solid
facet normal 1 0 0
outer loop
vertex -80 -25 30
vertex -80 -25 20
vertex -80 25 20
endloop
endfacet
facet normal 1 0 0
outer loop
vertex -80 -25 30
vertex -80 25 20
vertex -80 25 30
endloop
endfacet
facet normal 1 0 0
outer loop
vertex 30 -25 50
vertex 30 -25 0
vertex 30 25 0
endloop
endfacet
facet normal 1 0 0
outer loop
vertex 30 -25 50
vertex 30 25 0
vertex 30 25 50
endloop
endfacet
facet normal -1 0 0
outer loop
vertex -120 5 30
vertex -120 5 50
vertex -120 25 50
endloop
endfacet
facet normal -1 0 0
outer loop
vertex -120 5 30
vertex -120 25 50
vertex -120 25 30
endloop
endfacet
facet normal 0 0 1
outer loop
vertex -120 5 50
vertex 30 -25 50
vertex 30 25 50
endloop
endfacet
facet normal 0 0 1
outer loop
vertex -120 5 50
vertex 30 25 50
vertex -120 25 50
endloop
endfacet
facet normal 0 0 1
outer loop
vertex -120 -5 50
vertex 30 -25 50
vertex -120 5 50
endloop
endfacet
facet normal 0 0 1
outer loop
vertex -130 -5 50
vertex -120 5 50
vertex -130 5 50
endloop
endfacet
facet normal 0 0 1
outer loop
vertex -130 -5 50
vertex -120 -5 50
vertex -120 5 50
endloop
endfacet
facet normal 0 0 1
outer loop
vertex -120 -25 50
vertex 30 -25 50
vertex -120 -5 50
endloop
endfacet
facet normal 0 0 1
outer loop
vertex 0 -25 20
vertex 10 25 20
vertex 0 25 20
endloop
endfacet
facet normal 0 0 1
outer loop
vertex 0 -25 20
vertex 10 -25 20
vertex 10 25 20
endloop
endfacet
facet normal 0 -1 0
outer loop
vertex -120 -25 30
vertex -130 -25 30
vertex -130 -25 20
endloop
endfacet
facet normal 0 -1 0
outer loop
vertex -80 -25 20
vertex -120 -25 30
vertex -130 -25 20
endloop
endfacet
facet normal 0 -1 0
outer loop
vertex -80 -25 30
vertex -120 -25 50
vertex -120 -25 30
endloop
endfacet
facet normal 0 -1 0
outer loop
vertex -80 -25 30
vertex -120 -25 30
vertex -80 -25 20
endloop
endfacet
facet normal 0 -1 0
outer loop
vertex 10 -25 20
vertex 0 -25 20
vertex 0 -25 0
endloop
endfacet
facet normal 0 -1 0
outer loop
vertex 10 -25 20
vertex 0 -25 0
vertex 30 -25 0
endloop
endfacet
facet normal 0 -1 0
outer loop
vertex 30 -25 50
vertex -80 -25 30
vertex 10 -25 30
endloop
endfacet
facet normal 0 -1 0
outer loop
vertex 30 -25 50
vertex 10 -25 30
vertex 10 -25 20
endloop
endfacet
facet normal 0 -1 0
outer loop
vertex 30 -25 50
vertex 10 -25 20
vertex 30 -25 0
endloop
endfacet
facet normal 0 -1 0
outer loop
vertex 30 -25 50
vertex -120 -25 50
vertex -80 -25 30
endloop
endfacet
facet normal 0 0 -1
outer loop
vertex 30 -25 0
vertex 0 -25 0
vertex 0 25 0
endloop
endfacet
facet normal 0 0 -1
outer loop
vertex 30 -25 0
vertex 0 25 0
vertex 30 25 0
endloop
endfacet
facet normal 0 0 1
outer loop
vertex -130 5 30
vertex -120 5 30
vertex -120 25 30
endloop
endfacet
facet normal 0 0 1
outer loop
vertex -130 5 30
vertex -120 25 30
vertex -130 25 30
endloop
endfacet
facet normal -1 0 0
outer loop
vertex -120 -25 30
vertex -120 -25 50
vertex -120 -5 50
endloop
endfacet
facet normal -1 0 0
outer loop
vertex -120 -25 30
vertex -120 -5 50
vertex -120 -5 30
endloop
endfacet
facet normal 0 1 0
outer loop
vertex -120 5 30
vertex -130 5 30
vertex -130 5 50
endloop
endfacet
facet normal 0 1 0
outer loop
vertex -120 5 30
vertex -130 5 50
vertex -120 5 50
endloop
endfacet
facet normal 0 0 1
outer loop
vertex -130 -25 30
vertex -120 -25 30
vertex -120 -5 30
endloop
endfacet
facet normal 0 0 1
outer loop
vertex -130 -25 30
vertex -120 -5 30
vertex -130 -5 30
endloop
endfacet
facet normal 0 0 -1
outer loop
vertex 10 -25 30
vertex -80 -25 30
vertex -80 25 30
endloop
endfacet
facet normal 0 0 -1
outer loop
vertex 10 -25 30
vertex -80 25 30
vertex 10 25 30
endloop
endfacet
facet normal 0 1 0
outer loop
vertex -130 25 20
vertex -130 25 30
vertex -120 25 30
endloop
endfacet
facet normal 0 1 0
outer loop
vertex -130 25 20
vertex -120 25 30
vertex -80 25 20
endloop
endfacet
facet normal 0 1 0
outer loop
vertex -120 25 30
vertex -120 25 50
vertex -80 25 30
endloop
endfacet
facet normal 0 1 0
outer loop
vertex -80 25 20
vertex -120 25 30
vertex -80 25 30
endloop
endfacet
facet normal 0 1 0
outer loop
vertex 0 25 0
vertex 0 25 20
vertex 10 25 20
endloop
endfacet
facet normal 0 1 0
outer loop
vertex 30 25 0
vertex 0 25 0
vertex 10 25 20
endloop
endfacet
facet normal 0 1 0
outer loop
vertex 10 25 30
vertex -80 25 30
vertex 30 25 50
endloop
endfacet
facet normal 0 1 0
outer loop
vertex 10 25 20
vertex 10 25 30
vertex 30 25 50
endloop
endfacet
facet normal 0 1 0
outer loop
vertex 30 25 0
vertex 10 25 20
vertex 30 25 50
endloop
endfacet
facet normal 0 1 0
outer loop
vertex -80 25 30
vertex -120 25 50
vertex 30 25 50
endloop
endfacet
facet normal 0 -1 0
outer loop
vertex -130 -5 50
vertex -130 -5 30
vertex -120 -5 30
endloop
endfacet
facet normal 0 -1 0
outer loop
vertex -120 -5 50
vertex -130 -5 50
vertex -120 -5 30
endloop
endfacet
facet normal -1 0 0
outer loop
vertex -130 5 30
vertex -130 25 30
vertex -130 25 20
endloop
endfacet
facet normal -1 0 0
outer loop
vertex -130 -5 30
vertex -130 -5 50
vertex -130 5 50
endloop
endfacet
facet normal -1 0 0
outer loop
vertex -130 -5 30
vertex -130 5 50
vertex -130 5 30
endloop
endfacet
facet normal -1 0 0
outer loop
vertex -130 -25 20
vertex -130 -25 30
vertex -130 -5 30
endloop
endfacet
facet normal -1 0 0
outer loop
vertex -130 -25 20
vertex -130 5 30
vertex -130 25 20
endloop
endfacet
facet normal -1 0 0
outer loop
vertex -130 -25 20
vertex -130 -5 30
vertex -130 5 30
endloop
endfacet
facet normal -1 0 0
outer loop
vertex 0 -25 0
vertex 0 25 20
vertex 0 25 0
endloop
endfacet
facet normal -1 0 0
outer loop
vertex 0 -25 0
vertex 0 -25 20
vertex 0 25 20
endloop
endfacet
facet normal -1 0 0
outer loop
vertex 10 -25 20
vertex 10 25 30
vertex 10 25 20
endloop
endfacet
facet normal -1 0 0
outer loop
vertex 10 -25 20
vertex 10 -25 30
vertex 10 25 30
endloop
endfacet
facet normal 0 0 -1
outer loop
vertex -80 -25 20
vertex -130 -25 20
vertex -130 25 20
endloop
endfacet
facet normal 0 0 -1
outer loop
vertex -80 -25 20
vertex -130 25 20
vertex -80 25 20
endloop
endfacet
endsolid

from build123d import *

# Parameters (mm, degrees)
F1_DEPTH = 25
F2_W     = 10
F2_H     = 10
F3_DEPTH = 20


with BuildPart() as f1:
    # F0 (on Front) → F1 (new body, symmetric)
    with BuildSketch(Plane.XZ):
        Polygon((0, 20), (0, 0), (30, 0), (30, 50), (-120, 50), (-120, 30), (-130, 30), (-130, 20), (-80, 20), (-80, 30), (10, 30), (10, 20), align=None)
    extrude(amount=F1_DEPTH, both=True)

    # F2 (on face) → F3 (join, through all)
    with BuildSketch(Plane.XY.offset(30)):
        with Locations((-125, 0)):
            Rectangle(F2_W, F2_H)
    extrude(amount=F3_DEPTH)


solid = f1.part
